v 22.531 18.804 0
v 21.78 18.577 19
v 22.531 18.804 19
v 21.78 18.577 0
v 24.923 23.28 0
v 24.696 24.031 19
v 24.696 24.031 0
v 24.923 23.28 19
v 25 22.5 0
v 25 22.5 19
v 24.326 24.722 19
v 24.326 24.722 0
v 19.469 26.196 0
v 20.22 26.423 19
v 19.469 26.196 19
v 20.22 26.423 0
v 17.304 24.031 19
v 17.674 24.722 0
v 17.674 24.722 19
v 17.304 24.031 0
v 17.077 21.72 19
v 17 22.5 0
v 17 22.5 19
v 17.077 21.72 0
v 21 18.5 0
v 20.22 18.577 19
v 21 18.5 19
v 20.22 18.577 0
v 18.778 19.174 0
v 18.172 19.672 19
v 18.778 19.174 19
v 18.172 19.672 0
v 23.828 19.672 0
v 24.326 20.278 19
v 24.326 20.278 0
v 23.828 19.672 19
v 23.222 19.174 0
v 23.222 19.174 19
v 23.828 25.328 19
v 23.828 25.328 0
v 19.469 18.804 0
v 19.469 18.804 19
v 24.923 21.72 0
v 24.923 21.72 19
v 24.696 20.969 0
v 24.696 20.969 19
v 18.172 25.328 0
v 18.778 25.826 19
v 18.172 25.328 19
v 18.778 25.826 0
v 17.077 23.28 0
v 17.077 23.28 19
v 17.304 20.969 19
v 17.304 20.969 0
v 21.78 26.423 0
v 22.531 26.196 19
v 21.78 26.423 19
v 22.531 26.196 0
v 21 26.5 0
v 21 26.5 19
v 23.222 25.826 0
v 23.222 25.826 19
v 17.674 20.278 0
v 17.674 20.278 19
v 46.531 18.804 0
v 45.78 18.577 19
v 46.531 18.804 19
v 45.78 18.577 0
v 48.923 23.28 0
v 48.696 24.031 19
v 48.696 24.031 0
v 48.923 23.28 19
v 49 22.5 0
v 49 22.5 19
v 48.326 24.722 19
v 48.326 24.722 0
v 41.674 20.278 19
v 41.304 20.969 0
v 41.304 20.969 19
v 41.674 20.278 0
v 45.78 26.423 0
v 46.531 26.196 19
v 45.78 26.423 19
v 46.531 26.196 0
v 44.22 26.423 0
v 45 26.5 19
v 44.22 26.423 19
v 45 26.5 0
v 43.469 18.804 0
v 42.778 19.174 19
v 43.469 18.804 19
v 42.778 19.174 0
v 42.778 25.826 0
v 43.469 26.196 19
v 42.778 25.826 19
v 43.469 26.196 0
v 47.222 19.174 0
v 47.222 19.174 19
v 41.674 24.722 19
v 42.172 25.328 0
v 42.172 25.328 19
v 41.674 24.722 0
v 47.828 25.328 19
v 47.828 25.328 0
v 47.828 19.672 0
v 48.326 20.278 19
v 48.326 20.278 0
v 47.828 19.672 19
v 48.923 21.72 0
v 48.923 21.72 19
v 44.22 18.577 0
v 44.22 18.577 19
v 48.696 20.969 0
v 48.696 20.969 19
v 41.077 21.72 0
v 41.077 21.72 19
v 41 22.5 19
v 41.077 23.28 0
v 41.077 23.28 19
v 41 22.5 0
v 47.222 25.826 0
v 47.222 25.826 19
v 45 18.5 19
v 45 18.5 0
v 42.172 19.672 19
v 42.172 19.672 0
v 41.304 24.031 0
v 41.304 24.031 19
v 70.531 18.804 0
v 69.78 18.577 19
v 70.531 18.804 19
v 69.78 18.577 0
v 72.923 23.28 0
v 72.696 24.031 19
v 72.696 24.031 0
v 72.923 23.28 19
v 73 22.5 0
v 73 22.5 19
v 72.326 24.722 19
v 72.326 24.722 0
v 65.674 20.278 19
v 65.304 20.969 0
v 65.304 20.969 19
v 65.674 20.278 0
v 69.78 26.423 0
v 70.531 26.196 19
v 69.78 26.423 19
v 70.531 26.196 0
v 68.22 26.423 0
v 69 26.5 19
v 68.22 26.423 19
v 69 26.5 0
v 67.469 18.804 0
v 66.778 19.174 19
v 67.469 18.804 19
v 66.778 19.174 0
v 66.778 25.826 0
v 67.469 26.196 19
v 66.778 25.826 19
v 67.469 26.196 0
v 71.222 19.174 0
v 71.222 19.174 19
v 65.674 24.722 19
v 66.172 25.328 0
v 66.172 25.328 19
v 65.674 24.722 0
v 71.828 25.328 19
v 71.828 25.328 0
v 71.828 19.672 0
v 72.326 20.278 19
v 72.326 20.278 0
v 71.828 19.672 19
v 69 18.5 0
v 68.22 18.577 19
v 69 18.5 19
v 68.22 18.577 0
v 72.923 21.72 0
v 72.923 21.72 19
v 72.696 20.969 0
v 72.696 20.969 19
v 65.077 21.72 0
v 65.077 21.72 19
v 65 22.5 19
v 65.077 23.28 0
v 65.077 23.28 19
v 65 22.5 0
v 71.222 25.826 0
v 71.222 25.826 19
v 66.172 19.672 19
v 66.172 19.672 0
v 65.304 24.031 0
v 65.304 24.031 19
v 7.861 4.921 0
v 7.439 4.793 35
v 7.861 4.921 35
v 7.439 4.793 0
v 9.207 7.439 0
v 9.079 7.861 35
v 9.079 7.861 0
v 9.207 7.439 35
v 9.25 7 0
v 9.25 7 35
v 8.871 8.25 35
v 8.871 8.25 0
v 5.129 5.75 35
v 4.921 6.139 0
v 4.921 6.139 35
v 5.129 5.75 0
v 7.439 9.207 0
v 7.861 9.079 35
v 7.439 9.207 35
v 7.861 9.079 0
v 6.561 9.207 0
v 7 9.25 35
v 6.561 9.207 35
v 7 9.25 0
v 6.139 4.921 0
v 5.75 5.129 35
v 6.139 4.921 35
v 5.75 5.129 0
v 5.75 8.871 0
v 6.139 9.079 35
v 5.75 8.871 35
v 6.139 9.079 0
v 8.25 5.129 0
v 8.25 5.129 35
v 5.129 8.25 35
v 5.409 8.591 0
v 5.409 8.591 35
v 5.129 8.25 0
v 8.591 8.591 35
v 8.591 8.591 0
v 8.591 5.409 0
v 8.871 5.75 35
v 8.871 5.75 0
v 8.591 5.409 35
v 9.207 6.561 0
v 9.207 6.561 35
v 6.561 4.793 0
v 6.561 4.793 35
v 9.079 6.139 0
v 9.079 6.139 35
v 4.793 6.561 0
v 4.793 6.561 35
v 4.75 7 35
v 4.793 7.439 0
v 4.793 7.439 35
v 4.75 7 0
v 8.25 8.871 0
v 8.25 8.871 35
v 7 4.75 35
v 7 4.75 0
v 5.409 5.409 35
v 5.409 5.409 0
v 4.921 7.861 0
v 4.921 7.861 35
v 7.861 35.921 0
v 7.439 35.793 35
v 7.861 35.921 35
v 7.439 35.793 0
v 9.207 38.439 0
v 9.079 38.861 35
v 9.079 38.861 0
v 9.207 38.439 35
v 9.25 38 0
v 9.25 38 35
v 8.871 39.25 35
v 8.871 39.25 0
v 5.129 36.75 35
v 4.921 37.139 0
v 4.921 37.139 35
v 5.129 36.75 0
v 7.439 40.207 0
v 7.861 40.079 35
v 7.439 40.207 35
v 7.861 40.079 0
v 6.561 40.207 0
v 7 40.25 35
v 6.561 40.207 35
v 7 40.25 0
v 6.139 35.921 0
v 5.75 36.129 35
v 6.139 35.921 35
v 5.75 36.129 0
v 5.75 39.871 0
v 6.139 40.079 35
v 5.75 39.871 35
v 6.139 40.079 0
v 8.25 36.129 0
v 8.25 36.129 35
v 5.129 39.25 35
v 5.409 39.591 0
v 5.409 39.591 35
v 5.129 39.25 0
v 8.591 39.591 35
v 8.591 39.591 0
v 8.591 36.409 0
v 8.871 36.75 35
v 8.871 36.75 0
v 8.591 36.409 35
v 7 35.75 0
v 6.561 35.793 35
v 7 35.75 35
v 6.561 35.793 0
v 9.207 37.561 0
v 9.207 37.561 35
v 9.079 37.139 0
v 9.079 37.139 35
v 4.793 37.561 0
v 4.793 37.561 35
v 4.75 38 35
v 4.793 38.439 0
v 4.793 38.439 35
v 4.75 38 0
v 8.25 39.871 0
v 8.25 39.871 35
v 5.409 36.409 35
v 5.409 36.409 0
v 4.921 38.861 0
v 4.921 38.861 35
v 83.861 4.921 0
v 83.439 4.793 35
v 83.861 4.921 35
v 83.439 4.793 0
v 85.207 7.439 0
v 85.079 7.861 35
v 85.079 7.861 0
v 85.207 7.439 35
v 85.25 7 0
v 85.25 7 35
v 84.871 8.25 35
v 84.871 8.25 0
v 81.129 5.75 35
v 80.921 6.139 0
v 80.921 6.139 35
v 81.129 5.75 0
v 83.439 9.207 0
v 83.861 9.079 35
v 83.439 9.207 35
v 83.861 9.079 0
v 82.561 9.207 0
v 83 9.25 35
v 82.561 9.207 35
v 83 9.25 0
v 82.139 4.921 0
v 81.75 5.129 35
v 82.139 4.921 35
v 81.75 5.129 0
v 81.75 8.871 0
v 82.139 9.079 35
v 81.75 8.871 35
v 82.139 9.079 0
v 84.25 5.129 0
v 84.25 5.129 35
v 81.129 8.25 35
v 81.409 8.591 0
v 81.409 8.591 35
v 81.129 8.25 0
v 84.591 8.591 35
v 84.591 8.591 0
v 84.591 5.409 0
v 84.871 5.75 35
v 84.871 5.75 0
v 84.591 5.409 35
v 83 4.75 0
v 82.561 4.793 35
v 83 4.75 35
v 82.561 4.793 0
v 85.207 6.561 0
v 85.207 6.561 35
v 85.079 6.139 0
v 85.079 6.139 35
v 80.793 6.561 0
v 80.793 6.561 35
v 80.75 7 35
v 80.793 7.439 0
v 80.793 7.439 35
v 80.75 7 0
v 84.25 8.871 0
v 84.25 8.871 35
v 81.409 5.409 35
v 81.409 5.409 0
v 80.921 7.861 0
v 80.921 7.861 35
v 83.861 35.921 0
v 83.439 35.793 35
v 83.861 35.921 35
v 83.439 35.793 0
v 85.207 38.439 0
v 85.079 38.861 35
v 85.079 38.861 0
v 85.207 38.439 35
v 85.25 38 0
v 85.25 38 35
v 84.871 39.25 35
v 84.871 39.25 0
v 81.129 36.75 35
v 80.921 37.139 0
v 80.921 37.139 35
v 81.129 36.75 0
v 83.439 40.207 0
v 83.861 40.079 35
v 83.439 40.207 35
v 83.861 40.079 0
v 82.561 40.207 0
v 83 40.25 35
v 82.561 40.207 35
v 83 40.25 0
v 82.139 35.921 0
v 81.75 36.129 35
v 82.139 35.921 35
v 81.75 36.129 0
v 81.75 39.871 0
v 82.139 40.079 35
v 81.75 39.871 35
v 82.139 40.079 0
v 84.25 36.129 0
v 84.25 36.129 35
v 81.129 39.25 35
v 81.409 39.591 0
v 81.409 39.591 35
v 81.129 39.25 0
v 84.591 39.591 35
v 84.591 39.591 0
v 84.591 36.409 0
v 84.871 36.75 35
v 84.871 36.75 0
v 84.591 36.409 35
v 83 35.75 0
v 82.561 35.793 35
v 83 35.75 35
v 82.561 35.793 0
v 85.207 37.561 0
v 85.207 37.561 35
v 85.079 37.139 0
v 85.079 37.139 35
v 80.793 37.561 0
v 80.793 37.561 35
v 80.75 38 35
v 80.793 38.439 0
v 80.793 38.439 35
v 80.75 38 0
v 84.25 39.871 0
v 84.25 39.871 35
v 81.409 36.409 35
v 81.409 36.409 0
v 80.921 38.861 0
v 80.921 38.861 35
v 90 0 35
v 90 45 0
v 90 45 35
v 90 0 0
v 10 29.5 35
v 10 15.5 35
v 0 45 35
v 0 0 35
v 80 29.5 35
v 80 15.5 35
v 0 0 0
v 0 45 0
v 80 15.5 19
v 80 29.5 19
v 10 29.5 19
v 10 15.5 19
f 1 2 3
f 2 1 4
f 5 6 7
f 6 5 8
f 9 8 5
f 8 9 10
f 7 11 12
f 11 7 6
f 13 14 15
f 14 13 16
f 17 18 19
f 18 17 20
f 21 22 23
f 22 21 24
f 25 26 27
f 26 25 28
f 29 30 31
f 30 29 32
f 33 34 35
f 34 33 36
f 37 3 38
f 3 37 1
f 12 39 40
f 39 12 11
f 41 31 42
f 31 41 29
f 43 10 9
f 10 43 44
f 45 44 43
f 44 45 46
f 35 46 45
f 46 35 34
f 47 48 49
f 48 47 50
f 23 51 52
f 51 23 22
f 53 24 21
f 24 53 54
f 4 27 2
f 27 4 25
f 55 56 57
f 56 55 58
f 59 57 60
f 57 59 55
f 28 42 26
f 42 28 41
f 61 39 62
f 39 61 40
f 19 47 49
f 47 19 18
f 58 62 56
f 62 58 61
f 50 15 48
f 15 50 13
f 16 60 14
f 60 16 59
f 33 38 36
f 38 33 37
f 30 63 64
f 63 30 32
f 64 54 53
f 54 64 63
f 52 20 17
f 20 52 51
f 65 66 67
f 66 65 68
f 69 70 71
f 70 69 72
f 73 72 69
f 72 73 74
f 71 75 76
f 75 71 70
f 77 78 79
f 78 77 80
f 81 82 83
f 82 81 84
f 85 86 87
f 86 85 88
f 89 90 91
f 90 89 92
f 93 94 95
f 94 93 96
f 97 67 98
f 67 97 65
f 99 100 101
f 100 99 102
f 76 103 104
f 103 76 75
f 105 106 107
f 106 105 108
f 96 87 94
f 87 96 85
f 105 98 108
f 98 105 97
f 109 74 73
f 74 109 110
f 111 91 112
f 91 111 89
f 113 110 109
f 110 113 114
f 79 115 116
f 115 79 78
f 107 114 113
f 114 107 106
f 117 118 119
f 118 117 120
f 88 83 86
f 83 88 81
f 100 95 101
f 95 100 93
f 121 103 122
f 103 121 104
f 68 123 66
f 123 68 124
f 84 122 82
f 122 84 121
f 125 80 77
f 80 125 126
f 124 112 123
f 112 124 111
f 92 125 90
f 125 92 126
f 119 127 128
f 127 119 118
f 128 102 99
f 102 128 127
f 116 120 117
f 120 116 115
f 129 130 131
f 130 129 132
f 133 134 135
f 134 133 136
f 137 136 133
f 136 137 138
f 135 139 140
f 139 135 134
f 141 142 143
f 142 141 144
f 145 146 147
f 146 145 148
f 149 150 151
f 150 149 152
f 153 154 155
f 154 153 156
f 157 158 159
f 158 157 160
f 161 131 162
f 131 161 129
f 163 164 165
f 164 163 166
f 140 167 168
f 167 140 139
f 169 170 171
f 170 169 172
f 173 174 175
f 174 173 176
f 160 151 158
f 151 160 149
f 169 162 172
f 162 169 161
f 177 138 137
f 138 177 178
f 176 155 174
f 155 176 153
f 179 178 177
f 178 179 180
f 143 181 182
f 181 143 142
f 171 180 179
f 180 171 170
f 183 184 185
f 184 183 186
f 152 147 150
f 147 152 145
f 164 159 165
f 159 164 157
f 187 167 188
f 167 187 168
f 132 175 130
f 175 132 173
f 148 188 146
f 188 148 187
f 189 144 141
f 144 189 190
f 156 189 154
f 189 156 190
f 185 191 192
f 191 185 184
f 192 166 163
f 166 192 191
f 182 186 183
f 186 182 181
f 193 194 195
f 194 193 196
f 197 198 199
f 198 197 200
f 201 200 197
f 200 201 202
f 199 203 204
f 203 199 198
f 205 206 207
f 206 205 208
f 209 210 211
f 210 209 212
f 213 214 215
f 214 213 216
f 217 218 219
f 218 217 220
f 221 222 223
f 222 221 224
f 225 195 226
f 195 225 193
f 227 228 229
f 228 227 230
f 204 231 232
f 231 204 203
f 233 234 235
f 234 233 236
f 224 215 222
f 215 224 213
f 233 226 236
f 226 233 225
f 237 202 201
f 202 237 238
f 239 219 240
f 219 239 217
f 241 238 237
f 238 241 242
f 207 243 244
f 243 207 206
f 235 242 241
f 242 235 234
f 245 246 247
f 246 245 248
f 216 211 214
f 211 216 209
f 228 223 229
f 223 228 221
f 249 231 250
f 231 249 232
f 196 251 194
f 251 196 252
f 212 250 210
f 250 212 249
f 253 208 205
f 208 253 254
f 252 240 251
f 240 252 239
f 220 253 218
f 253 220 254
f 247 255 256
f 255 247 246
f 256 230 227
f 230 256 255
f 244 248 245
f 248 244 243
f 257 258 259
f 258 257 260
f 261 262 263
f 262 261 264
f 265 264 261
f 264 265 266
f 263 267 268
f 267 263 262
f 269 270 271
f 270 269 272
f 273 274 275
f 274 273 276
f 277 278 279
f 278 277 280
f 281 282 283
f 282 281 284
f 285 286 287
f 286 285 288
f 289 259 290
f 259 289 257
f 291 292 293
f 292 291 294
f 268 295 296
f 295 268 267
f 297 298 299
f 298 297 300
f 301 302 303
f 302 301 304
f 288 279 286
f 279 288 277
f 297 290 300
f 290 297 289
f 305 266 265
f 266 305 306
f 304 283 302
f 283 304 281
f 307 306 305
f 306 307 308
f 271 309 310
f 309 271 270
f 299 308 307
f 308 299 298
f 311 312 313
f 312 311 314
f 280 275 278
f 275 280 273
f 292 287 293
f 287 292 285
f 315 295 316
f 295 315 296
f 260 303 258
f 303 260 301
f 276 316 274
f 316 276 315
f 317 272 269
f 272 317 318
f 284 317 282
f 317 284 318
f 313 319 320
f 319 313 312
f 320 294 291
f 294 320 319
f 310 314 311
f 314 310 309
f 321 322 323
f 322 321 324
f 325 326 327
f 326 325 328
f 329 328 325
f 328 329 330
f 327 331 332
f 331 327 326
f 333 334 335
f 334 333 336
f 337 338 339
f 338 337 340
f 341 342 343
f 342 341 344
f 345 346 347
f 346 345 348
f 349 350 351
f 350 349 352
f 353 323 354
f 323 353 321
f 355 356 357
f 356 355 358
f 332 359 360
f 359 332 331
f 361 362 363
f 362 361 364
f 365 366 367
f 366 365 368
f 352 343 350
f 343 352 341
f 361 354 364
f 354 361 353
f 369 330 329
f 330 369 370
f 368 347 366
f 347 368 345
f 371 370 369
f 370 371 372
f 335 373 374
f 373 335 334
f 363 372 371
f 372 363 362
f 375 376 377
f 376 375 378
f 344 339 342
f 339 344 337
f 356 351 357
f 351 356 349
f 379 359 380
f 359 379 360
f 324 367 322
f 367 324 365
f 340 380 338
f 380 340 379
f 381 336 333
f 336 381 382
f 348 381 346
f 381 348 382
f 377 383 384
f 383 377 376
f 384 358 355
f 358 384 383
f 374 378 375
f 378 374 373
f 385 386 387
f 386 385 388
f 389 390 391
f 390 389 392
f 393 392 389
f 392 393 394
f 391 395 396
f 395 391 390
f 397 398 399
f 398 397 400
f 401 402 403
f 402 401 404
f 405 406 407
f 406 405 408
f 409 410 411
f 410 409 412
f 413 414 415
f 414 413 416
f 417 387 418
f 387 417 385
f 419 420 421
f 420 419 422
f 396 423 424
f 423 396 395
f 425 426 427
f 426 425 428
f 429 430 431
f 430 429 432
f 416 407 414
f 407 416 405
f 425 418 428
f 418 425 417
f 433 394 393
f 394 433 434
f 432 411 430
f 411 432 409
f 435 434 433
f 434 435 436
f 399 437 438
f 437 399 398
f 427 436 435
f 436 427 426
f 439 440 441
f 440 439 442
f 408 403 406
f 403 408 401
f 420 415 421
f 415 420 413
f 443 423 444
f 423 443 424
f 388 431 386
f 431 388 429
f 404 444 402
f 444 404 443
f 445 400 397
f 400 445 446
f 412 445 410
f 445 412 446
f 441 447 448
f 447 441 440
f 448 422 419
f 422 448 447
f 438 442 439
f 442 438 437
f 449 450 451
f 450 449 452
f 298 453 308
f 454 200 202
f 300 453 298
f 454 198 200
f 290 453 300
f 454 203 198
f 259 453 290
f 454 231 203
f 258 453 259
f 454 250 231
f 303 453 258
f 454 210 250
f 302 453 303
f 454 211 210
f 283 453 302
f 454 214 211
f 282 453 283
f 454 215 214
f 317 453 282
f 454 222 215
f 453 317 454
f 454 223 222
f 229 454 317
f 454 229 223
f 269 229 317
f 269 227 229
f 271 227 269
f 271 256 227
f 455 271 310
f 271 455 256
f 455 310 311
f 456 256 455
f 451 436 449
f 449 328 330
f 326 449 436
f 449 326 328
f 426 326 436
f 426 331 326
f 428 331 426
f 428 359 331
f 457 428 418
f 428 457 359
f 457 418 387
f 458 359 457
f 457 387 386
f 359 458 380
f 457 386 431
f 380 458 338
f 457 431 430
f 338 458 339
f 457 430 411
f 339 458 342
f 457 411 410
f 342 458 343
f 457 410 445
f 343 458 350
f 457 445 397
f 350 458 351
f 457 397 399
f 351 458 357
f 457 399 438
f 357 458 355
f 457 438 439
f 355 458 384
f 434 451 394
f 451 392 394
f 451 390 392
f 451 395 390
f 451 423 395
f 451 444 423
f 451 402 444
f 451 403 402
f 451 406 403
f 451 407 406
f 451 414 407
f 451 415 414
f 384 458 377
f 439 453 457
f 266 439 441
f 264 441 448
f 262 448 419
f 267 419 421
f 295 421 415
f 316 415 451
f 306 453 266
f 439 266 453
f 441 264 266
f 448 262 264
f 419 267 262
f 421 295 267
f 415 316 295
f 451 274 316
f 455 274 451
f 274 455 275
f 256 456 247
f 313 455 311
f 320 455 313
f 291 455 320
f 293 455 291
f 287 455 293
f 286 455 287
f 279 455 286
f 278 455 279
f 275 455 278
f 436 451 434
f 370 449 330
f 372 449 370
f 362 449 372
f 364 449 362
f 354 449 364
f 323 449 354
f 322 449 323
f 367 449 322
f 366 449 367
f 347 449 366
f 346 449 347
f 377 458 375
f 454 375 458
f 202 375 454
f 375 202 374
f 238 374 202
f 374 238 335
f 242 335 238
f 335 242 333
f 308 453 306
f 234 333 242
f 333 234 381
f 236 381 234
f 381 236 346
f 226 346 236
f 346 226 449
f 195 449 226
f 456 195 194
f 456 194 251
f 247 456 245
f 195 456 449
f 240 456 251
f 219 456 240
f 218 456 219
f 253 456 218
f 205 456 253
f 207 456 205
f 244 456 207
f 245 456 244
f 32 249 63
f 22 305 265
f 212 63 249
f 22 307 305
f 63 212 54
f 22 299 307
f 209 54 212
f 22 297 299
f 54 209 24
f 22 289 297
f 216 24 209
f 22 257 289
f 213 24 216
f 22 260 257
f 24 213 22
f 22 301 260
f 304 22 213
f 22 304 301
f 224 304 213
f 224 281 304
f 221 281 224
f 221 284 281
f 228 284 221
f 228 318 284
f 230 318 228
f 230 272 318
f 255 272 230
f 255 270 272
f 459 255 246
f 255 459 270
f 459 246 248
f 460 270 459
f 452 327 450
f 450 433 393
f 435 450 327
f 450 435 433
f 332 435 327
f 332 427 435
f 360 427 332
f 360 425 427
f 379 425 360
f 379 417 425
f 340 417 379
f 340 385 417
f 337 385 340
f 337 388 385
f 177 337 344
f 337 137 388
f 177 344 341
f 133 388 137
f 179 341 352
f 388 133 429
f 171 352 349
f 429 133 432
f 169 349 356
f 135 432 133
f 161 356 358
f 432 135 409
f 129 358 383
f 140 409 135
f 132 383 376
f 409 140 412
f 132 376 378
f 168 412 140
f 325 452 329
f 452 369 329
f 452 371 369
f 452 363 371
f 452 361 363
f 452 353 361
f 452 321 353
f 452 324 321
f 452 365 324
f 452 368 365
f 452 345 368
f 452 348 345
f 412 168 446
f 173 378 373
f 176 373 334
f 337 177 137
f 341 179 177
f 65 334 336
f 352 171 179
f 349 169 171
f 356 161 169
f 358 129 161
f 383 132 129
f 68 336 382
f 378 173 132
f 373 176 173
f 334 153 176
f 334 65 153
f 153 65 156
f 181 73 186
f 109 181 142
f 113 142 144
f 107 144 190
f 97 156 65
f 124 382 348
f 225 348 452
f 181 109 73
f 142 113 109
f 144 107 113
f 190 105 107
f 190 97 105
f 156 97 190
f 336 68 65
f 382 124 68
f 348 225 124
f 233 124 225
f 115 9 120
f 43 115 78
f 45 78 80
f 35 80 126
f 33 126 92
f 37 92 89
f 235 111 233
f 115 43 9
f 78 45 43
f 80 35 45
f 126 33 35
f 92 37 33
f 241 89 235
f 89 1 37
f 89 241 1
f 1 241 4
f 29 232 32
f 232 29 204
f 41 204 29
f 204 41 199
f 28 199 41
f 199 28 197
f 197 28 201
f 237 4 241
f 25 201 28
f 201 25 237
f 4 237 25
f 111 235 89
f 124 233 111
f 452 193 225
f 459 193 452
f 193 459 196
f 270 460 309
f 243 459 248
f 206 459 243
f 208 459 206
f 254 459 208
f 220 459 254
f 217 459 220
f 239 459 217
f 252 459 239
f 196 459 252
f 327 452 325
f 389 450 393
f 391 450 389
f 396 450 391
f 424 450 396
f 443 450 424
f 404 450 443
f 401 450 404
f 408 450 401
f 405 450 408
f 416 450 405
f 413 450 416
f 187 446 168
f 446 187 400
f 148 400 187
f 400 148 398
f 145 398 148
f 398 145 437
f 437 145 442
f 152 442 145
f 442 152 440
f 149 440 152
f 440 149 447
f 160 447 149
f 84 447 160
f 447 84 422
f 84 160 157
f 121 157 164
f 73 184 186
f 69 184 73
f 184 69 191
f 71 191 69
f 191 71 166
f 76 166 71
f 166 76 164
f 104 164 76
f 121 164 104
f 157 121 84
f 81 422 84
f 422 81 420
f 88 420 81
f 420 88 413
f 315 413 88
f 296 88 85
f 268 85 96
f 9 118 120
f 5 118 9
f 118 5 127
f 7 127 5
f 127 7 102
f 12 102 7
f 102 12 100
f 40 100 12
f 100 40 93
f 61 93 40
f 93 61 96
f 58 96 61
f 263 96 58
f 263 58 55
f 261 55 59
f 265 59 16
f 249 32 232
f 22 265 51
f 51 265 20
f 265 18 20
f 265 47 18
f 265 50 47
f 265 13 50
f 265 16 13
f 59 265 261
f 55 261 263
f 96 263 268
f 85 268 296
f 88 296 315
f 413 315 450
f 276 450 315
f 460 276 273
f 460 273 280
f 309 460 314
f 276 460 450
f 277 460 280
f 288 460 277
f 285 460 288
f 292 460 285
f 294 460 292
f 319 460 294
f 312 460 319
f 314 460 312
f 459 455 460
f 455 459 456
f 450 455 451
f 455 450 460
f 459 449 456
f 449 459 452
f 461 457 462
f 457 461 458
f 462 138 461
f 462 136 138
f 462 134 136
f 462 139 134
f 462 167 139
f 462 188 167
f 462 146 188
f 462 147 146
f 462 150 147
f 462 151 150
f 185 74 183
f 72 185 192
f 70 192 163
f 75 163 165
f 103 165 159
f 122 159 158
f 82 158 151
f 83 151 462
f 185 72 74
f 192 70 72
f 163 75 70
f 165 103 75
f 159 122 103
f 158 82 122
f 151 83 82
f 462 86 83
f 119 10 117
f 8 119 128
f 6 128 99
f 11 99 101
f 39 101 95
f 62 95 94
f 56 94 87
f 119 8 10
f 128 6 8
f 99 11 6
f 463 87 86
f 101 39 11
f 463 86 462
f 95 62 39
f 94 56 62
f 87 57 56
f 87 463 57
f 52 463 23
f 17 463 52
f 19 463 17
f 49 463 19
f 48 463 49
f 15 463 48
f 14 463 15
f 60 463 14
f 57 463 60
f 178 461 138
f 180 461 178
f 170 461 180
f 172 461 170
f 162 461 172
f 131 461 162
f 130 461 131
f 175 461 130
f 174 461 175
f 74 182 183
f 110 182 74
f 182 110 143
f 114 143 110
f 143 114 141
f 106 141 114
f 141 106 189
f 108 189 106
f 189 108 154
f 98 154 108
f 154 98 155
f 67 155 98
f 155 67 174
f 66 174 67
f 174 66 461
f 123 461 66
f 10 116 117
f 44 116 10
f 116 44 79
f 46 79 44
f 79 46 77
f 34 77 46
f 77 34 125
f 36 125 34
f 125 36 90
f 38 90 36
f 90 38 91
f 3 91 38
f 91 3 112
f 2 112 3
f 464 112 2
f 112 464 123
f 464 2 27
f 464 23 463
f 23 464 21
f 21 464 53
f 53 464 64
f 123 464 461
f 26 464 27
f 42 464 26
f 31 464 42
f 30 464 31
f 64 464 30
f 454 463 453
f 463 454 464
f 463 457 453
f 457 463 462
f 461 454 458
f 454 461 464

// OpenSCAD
$fn = 32;

// ----------------------------------------------------------------------
// Manifold block: gallery_top manifold
// ----------------------------------------------------------------------

// --- parameters (mm) ---
block_l = 90;             // block length, X
block_w = 45;             // block width, Y
block_h = 35;             // block height, Z
port_d = 8;               // port bore diameter
port_pitch = 24;          // port pitch along X
gallery_d = 14;           // top gallery width, Y
gallery_depth = 16;       // gallery pocket depth
wall_p = 10;              // gallery end wall thickness, X
mnt_d = 4.5;              // mounting hole diameter
mnt_in = 7;               // mounting hole inset from the edges
fit_tol = 0.05;           // tolerance for press fits, mm
free_tol = 0.3;           // tolerance for clearance fits, mm

n_ports = 3;  // ports in the row
port_x0 = (block_l - (n_ports - 1) * port_pitch) / 2;  // first port X

difference() {
  cube([block_l, block_w, block_h]);
  for (i = [0 : n_ports - 1])
    translate([port_x0 + i * port_pitch, block_w / 2, -1])
      cylinder(h = block_h + 2, d = port_d);
  translate([wall_p, block_w / 2 - gallery_d / 2, block_h - gallery_depth])
    cube([block_l - 2 * wall_p, gallery_d, gallery_depth + 1]);
  for (cx = [mnt_in, block_l - mnt_in])
    for (cy = [mnt_in, block_w - mnt_in])
      translate([cx, cy, -1]) cylinder(h = block_h + 2, d = mnt_d);
}
